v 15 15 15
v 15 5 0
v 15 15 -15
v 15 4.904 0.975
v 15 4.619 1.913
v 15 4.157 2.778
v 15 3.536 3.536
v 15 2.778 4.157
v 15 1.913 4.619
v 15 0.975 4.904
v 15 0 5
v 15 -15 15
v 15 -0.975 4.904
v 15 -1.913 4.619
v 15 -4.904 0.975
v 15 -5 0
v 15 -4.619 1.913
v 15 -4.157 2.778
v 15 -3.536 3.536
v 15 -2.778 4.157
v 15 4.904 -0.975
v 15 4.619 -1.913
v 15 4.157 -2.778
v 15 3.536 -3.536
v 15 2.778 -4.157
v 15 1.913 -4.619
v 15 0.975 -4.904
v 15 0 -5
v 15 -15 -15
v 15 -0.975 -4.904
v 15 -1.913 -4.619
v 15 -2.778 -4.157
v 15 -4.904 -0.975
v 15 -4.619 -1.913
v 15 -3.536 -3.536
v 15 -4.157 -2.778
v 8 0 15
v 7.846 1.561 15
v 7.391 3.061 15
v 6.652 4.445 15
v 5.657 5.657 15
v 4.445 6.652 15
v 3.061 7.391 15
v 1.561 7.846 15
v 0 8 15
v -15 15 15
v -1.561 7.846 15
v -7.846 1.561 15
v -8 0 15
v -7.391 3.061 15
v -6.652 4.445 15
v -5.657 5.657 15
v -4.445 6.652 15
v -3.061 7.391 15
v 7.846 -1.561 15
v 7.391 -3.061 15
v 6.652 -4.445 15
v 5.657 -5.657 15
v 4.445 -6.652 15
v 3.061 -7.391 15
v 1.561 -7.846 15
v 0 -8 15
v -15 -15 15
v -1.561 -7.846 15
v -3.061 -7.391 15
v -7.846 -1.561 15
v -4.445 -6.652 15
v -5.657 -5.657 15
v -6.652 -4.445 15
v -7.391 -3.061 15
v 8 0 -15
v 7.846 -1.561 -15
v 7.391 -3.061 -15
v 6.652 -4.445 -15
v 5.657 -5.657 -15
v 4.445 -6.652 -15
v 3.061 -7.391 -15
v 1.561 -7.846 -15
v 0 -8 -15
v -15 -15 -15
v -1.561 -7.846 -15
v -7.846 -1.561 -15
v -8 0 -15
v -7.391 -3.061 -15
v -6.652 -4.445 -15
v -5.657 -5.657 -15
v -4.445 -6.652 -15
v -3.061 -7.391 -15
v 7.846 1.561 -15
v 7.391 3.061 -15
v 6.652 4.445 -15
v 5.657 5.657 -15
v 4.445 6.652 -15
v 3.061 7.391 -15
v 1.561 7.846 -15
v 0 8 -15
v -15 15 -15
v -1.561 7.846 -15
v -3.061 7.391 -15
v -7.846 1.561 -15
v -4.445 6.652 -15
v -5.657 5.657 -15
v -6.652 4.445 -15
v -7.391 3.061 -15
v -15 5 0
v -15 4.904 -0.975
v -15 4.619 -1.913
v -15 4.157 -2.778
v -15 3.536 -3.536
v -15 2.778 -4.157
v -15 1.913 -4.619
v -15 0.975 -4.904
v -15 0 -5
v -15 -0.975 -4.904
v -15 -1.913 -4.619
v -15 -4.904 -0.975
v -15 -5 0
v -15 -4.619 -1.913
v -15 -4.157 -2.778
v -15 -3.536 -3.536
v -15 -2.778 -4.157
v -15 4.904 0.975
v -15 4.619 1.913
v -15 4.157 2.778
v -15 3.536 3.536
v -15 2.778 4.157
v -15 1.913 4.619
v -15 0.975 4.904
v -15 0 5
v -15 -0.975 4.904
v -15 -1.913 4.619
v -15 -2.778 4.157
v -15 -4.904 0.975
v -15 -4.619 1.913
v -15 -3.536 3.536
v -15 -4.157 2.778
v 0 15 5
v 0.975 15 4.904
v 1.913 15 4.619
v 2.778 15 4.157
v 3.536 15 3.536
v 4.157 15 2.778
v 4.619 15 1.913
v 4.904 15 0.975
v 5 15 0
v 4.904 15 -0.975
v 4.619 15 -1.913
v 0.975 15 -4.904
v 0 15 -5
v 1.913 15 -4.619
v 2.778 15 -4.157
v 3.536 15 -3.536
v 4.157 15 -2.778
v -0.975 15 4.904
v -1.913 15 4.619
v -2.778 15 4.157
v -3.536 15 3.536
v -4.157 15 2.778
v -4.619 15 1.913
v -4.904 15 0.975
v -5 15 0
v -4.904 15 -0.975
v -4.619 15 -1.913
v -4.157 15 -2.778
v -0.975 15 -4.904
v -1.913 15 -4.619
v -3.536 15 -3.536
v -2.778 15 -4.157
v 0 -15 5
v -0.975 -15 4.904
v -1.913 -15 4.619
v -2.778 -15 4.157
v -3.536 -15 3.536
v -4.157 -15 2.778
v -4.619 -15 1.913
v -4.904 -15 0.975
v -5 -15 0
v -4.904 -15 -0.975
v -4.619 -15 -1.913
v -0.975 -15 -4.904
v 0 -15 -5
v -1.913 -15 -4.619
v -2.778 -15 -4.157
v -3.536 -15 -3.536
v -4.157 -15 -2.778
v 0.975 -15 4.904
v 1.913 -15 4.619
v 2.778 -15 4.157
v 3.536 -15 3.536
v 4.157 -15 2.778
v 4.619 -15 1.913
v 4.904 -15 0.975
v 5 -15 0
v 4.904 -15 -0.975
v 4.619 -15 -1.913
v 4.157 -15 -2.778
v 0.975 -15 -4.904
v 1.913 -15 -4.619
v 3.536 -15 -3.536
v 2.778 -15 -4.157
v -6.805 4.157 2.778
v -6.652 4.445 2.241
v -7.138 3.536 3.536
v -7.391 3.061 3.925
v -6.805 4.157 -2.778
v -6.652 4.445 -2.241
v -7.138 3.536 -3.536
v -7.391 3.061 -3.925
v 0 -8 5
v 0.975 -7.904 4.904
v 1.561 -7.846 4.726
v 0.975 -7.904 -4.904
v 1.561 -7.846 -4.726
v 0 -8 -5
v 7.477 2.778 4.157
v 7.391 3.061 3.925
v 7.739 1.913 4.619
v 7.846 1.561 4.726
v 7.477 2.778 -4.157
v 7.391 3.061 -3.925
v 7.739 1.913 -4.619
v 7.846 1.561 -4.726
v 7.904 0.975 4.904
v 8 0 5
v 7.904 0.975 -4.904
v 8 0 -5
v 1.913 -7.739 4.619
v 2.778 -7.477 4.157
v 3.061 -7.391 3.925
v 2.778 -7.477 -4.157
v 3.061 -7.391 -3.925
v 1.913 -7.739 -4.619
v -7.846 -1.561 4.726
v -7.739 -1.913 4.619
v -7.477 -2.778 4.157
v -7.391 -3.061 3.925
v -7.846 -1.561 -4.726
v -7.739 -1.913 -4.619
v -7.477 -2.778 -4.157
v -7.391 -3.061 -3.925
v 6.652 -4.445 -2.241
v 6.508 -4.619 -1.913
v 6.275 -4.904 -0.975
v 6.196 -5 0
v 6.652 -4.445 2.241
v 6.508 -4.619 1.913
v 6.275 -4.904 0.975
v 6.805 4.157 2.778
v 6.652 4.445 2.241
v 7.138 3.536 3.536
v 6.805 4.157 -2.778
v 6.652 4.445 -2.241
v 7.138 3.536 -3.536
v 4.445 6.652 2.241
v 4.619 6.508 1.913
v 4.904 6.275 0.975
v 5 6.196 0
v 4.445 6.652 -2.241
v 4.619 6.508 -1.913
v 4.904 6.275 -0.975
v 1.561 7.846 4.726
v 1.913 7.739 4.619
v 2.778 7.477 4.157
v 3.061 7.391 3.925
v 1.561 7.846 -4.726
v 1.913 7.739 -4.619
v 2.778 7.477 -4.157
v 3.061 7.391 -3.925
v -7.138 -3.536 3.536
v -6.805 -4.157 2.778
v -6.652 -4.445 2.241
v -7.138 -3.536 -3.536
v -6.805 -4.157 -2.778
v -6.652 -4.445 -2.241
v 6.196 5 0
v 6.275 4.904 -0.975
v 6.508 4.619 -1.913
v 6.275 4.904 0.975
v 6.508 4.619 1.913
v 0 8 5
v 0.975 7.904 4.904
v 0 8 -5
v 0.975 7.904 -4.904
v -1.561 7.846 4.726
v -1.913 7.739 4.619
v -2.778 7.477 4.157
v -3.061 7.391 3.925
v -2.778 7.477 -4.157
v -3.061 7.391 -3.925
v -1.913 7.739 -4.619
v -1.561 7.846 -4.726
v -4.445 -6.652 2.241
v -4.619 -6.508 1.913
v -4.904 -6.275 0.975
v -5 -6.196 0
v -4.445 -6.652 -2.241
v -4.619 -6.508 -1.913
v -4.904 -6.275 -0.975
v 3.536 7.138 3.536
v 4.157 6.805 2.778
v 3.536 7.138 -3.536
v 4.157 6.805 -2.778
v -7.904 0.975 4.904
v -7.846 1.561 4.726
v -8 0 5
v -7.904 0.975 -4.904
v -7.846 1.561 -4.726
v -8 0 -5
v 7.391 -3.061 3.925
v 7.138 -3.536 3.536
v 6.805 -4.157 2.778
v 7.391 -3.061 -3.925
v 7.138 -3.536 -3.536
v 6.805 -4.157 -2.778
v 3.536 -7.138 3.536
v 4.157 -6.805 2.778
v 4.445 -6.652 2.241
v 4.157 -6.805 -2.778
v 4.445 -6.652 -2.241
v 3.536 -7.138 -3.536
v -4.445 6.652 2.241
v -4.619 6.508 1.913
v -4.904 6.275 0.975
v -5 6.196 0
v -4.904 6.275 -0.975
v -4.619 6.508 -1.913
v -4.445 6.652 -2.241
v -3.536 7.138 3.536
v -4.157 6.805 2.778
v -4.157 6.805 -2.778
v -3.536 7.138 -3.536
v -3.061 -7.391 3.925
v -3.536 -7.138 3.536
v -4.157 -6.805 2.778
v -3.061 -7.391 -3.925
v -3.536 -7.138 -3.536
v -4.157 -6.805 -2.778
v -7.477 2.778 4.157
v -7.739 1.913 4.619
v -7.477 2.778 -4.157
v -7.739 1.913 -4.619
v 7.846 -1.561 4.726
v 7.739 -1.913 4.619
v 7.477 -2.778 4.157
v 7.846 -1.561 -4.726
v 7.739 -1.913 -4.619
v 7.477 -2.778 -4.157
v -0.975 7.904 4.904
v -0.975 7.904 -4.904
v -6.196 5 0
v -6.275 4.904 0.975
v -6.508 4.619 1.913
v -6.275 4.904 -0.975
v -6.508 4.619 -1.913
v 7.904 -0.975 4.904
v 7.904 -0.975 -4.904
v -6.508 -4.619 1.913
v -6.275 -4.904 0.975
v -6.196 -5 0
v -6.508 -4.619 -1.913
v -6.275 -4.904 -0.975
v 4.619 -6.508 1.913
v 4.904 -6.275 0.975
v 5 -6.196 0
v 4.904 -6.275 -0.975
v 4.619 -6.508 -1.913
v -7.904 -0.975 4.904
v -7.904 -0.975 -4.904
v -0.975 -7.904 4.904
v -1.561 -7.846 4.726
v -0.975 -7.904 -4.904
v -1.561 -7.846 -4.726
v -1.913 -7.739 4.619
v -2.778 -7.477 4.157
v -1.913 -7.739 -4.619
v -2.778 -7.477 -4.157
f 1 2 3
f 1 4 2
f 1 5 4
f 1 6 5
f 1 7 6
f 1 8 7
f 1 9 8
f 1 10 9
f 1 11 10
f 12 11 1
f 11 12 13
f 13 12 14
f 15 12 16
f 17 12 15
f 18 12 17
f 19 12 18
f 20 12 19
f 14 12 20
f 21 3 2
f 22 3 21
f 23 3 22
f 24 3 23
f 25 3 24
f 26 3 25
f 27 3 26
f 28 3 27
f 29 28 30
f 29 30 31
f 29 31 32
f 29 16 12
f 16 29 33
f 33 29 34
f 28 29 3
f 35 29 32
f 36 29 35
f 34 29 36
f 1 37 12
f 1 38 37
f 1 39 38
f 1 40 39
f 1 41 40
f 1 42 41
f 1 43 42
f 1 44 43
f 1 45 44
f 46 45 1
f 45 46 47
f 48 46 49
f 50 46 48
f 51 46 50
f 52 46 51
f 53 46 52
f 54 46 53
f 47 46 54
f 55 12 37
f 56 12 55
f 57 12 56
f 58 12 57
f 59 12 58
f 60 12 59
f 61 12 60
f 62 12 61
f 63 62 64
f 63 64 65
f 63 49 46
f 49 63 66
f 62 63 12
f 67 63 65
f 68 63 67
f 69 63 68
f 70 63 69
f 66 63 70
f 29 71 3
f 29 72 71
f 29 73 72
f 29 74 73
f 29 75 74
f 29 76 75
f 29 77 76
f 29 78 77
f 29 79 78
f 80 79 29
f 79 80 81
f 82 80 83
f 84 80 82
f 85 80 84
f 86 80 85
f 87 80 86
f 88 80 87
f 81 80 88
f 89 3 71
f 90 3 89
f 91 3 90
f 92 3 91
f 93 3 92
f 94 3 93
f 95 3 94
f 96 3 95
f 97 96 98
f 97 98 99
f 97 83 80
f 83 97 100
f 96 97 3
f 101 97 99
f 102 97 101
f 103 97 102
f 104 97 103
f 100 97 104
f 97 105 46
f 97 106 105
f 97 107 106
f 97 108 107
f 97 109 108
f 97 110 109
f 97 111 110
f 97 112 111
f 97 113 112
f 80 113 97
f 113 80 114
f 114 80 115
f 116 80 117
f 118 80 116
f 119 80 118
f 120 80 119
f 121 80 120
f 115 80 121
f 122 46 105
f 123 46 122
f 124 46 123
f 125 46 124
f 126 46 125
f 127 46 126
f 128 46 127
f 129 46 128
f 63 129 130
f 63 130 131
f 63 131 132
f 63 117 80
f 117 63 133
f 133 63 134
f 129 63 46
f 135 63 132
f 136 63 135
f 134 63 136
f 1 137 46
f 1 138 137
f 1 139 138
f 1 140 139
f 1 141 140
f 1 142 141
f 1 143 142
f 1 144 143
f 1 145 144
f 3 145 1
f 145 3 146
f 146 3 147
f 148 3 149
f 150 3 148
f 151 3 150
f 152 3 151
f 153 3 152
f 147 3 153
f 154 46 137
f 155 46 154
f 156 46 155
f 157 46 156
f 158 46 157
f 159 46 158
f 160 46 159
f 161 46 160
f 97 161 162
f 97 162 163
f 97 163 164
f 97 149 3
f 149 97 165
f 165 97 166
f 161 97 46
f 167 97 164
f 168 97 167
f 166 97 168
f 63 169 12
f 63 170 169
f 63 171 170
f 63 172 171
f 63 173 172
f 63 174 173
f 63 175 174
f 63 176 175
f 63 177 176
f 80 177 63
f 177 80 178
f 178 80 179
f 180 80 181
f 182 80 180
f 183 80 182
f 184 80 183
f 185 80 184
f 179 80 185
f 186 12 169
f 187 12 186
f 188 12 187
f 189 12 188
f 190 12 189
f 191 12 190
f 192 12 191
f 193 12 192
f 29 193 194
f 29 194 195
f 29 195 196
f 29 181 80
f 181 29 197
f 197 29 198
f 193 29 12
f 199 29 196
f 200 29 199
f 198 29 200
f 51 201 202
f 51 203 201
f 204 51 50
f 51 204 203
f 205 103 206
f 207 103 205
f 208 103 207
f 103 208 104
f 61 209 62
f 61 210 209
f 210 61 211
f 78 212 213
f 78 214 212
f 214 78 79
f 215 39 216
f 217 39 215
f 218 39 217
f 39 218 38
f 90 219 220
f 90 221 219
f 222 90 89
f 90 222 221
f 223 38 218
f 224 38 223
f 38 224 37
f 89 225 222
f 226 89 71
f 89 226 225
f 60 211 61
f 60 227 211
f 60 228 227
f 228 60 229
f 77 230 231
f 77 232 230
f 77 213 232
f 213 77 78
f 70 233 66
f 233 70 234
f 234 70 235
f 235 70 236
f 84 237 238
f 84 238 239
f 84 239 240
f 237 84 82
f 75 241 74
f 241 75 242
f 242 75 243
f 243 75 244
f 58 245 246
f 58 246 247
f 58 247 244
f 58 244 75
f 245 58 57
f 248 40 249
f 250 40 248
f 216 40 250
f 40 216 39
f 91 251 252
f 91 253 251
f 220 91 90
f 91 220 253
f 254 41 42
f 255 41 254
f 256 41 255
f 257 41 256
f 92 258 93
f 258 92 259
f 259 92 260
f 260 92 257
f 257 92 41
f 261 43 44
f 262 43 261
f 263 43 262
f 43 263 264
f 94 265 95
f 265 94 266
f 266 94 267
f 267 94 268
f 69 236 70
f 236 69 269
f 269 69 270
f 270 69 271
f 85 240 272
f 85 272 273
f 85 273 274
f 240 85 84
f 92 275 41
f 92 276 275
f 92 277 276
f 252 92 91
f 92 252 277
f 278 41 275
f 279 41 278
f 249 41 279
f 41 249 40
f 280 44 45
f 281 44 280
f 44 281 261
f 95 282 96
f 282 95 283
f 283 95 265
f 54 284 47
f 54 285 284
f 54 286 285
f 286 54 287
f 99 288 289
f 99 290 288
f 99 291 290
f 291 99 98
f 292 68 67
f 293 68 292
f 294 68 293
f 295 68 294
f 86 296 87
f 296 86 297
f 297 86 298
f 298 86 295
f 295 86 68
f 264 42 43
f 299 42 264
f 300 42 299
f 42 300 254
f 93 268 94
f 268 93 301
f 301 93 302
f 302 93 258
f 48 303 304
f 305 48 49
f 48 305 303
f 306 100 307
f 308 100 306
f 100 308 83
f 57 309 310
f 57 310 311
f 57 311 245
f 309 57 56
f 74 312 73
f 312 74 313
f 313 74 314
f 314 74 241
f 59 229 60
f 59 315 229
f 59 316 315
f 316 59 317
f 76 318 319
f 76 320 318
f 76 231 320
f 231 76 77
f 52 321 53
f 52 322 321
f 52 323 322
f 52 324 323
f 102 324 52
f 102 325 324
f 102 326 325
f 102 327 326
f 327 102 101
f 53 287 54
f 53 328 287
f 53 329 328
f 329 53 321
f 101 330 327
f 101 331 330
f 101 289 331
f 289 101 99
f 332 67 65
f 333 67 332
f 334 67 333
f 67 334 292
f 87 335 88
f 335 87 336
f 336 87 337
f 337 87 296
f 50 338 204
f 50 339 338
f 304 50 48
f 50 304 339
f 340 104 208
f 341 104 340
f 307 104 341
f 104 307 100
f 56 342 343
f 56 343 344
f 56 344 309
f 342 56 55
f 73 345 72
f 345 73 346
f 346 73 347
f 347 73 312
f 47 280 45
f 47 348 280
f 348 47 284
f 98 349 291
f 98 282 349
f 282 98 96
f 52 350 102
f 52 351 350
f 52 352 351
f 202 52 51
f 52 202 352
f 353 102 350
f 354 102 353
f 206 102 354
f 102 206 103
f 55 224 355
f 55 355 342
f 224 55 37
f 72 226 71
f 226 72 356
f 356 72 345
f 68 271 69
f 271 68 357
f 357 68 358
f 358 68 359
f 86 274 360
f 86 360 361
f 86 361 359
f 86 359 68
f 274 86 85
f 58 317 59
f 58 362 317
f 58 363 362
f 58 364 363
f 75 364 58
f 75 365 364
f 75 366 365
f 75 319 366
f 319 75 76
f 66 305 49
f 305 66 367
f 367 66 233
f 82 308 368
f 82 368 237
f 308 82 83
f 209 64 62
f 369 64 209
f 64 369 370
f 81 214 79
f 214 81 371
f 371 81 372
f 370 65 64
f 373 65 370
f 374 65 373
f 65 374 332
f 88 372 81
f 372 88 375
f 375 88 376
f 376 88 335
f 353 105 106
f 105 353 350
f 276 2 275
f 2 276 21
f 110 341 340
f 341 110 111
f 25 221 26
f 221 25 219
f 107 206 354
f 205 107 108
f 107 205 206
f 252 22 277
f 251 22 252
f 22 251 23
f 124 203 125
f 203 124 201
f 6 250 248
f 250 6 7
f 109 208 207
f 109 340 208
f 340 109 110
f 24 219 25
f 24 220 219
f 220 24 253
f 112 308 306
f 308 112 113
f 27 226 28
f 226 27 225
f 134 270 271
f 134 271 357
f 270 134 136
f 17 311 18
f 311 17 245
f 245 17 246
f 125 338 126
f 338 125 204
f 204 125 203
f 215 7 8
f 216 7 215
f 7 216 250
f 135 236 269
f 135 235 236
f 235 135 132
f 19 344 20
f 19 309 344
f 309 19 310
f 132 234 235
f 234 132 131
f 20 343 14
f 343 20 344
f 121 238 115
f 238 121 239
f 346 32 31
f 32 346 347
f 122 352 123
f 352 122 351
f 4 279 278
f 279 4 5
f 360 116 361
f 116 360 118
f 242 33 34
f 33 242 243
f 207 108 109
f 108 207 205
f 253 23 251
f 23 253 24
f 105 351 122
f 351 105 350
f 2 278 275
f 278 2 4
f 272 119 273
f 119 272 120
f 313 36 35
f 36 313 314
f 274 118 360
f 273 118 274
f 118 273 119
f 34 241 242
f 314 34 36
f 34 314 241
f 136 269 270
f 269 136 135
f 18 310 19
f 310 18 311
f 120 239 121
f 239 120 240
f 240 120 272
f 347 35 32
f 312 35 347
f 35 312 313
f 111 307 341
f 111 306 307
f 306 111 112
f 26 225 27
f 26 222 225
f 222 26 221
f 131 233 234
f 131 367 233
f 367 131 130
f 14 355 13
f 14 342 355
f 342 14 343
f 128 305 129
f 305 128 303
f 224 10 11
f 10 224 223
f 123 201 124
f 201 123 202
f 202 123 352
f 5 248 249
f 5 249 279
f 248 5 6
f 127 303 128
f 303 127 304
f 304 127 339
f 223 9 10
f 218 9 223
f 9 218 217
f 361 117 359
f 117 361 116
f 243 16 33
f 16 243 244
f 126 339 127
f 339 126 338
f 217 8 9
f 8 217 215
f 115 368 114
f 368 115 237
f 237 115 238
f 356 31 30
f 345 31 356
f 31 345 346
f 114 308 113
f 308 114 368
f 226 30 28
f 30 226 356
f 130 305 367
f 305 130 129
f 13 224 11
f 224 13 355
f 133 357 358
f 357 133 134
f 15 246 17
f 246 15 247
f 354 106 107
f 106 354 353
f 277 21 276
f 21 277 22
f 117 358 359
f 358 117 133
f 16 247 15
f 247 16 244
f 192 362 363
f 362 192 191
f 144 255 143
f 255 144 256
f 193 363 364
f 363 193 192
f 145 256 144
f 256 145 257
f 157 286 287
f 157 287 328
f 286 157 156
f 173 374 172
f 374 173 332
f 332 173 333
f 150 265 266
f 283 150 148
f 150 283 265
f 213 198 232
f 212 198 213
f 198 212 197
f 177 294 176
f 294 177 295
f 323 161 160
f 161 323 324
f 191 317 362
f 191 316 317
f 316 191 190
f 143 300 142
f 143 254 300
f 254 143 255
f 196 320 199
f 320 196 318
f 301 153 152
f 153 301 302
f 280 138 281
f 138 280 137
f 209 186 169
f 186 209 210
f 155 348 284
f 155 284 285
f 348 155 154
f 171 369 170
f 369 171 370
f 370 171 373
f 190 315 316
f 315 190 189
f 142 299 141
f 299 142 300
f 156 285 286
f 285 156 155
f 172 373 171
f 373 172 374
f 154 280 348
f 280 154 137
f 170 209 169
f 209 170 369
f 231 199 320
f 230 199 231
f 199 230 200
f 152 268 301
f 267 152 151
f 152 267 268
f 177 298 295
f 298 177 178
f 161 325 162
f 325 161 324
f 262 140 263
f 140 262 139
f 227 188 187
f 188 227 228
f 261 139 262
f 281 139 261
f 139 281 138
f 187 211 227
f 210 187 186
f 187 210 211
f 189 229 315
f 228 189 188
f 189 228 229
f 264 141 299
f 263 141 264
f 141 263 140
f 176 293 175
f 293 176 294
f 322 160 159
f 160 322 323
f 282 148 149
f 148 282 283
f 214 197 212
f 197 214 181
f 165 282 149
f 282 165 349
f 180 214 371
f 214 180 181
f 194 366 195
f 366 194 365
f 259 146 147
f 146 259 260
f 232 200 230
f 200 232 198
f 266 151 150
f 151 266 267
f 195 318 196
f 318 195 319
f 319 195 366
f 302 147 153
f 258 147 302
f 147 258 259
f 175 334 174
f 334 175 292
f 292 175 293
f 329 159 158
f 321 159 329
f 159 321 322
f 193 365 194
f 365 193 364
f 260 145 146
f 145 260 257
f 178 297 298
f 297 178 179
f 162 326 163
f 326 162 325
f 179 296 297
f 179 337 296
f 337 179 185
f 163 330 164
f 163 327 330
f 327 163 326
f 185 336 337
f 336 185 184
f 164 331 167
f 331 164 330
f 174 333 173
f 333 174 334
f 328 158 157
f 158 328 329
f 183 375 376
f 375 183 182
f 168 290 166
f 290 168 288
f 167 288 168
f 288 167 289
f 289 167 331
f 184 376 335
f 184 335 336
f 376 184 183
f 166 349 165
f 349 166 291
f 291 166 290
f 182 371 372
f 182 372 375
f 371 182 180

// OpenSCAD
// Difference operation test
$fn = 32;

// Cube with cylindrical hole
difference() {
    // Outer cube
    cube([30, 30, 30], center=true);
    
    // Inner cylinder (hole)
    cylinder(h=35, r=8, center=true);
    
    // Side holes
    rotate([0, 90, 0])
        cylinder(h=35, r=5, center=true);
    
    rotate([90, 0, 0])
        cylinder(h=35, r=5, center=true);
}

// This demonstrates the enhanced STL generation
// for complex boolean operations
